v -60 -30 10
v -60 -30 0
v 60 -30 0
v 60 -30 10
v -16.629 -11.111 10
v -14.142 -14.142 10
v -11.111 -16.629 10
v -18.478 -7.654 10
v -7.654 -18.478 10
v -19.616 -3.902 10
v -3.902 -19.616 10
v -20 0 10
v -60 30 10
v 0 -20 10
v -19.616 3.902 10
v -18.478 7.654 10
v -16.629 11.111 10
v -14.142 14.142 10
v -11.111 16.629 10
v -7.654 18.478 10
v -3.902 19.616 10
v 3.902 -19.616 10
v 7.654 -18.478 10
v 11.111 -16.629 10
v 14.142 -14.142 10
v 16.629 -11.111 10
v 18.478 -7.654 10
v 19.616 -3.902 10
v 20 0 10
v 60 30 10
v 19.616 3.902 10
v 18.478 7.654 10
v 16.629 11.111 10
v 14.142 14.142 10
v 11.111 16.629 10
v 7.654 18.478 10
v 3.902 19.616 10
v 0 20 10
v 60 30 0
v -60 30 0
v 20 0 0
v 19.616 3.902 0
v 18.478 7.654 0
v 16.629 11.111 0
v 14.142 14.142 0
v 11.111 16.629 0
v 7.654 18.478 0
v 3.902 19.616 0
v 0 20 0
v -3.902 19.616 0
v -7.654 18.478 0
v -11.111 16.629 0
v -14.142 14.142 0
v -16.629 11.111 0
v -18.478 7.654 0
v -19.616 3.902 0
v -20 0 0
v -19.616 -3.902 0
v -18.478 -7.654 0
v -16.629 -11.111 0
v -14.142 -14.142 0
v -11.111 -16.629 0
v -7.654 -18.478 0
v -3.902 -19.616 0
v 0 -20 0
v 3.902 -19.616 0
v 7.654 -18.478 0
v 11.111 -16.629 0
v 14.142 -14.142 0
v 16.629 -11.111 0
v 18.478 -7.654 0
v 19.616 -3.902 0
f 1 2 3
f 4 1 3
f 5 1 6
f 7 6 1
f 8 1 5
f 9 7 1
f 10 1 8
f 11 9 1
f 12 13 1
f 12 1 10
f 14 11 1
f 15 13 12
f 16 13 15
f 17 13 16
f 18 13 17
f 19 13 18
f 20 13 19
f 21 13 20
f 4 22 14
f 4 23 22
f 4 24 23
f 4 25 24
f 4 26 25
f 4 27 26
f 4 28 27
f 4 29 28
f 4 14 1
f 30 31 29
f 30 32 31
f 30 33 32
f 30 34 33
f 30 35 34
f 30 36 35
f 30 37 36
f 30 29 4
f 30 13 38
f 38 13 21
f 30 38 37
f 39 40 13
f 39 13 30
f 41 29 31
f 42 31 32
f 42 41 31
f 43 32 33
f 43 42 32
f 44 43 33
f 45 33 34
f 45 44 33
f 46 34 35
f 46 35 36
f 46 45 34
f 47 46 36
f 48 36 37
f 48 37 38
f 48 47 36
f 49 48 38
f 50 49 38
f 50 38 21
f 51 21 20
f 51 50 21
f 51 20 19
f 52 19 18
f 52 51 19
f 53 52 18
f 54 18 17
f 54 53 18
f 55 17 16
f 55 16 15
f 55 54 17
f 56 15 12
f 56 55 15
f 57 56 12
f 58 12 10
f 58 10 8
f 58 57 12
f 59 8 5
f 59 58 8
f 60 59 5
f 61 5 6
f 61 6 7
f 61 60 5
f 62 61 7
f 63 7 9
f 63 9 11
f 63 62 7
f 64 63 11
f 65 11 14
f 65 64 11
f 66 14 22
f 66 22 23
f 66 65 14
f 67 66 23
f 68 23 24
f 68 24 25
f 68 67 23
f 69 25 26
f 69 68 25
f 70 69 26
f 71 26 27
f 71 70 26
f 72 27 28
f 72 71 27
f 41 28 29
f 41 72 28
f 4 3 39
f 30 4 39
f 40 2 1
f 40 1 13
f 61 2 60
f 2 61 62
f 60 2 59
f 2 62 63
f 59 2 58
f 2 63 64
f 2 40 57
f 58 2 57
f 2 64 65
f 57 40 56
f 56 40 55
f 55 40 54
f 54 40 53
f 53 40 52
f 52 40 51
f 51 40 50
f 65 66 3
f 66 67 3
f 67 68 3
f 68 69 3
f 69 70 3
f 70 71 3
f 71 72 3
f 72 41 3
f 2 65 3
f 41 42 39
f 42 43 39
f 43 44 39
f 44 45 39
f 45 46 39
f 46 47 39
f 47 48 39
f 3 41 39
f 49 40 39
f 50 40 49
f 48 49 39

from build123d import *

# Parameters (mm, degrees)
SKETCH_W  = 120
SKETCH_H  = 60
SKETCH_R  = 20
PAD_DEPTH = 10


with BuildPart() as part:
    # Sketch → Pad (new body)
    with BuildSketch(Plane.XY):
        Rectangle(SKETCH_W, SKETCH_H)
        Circle(SKETCH_R, mode=Mode.SUBTRACT)
    extrude(amount=PAD_DEPTH)


solid = part.part
